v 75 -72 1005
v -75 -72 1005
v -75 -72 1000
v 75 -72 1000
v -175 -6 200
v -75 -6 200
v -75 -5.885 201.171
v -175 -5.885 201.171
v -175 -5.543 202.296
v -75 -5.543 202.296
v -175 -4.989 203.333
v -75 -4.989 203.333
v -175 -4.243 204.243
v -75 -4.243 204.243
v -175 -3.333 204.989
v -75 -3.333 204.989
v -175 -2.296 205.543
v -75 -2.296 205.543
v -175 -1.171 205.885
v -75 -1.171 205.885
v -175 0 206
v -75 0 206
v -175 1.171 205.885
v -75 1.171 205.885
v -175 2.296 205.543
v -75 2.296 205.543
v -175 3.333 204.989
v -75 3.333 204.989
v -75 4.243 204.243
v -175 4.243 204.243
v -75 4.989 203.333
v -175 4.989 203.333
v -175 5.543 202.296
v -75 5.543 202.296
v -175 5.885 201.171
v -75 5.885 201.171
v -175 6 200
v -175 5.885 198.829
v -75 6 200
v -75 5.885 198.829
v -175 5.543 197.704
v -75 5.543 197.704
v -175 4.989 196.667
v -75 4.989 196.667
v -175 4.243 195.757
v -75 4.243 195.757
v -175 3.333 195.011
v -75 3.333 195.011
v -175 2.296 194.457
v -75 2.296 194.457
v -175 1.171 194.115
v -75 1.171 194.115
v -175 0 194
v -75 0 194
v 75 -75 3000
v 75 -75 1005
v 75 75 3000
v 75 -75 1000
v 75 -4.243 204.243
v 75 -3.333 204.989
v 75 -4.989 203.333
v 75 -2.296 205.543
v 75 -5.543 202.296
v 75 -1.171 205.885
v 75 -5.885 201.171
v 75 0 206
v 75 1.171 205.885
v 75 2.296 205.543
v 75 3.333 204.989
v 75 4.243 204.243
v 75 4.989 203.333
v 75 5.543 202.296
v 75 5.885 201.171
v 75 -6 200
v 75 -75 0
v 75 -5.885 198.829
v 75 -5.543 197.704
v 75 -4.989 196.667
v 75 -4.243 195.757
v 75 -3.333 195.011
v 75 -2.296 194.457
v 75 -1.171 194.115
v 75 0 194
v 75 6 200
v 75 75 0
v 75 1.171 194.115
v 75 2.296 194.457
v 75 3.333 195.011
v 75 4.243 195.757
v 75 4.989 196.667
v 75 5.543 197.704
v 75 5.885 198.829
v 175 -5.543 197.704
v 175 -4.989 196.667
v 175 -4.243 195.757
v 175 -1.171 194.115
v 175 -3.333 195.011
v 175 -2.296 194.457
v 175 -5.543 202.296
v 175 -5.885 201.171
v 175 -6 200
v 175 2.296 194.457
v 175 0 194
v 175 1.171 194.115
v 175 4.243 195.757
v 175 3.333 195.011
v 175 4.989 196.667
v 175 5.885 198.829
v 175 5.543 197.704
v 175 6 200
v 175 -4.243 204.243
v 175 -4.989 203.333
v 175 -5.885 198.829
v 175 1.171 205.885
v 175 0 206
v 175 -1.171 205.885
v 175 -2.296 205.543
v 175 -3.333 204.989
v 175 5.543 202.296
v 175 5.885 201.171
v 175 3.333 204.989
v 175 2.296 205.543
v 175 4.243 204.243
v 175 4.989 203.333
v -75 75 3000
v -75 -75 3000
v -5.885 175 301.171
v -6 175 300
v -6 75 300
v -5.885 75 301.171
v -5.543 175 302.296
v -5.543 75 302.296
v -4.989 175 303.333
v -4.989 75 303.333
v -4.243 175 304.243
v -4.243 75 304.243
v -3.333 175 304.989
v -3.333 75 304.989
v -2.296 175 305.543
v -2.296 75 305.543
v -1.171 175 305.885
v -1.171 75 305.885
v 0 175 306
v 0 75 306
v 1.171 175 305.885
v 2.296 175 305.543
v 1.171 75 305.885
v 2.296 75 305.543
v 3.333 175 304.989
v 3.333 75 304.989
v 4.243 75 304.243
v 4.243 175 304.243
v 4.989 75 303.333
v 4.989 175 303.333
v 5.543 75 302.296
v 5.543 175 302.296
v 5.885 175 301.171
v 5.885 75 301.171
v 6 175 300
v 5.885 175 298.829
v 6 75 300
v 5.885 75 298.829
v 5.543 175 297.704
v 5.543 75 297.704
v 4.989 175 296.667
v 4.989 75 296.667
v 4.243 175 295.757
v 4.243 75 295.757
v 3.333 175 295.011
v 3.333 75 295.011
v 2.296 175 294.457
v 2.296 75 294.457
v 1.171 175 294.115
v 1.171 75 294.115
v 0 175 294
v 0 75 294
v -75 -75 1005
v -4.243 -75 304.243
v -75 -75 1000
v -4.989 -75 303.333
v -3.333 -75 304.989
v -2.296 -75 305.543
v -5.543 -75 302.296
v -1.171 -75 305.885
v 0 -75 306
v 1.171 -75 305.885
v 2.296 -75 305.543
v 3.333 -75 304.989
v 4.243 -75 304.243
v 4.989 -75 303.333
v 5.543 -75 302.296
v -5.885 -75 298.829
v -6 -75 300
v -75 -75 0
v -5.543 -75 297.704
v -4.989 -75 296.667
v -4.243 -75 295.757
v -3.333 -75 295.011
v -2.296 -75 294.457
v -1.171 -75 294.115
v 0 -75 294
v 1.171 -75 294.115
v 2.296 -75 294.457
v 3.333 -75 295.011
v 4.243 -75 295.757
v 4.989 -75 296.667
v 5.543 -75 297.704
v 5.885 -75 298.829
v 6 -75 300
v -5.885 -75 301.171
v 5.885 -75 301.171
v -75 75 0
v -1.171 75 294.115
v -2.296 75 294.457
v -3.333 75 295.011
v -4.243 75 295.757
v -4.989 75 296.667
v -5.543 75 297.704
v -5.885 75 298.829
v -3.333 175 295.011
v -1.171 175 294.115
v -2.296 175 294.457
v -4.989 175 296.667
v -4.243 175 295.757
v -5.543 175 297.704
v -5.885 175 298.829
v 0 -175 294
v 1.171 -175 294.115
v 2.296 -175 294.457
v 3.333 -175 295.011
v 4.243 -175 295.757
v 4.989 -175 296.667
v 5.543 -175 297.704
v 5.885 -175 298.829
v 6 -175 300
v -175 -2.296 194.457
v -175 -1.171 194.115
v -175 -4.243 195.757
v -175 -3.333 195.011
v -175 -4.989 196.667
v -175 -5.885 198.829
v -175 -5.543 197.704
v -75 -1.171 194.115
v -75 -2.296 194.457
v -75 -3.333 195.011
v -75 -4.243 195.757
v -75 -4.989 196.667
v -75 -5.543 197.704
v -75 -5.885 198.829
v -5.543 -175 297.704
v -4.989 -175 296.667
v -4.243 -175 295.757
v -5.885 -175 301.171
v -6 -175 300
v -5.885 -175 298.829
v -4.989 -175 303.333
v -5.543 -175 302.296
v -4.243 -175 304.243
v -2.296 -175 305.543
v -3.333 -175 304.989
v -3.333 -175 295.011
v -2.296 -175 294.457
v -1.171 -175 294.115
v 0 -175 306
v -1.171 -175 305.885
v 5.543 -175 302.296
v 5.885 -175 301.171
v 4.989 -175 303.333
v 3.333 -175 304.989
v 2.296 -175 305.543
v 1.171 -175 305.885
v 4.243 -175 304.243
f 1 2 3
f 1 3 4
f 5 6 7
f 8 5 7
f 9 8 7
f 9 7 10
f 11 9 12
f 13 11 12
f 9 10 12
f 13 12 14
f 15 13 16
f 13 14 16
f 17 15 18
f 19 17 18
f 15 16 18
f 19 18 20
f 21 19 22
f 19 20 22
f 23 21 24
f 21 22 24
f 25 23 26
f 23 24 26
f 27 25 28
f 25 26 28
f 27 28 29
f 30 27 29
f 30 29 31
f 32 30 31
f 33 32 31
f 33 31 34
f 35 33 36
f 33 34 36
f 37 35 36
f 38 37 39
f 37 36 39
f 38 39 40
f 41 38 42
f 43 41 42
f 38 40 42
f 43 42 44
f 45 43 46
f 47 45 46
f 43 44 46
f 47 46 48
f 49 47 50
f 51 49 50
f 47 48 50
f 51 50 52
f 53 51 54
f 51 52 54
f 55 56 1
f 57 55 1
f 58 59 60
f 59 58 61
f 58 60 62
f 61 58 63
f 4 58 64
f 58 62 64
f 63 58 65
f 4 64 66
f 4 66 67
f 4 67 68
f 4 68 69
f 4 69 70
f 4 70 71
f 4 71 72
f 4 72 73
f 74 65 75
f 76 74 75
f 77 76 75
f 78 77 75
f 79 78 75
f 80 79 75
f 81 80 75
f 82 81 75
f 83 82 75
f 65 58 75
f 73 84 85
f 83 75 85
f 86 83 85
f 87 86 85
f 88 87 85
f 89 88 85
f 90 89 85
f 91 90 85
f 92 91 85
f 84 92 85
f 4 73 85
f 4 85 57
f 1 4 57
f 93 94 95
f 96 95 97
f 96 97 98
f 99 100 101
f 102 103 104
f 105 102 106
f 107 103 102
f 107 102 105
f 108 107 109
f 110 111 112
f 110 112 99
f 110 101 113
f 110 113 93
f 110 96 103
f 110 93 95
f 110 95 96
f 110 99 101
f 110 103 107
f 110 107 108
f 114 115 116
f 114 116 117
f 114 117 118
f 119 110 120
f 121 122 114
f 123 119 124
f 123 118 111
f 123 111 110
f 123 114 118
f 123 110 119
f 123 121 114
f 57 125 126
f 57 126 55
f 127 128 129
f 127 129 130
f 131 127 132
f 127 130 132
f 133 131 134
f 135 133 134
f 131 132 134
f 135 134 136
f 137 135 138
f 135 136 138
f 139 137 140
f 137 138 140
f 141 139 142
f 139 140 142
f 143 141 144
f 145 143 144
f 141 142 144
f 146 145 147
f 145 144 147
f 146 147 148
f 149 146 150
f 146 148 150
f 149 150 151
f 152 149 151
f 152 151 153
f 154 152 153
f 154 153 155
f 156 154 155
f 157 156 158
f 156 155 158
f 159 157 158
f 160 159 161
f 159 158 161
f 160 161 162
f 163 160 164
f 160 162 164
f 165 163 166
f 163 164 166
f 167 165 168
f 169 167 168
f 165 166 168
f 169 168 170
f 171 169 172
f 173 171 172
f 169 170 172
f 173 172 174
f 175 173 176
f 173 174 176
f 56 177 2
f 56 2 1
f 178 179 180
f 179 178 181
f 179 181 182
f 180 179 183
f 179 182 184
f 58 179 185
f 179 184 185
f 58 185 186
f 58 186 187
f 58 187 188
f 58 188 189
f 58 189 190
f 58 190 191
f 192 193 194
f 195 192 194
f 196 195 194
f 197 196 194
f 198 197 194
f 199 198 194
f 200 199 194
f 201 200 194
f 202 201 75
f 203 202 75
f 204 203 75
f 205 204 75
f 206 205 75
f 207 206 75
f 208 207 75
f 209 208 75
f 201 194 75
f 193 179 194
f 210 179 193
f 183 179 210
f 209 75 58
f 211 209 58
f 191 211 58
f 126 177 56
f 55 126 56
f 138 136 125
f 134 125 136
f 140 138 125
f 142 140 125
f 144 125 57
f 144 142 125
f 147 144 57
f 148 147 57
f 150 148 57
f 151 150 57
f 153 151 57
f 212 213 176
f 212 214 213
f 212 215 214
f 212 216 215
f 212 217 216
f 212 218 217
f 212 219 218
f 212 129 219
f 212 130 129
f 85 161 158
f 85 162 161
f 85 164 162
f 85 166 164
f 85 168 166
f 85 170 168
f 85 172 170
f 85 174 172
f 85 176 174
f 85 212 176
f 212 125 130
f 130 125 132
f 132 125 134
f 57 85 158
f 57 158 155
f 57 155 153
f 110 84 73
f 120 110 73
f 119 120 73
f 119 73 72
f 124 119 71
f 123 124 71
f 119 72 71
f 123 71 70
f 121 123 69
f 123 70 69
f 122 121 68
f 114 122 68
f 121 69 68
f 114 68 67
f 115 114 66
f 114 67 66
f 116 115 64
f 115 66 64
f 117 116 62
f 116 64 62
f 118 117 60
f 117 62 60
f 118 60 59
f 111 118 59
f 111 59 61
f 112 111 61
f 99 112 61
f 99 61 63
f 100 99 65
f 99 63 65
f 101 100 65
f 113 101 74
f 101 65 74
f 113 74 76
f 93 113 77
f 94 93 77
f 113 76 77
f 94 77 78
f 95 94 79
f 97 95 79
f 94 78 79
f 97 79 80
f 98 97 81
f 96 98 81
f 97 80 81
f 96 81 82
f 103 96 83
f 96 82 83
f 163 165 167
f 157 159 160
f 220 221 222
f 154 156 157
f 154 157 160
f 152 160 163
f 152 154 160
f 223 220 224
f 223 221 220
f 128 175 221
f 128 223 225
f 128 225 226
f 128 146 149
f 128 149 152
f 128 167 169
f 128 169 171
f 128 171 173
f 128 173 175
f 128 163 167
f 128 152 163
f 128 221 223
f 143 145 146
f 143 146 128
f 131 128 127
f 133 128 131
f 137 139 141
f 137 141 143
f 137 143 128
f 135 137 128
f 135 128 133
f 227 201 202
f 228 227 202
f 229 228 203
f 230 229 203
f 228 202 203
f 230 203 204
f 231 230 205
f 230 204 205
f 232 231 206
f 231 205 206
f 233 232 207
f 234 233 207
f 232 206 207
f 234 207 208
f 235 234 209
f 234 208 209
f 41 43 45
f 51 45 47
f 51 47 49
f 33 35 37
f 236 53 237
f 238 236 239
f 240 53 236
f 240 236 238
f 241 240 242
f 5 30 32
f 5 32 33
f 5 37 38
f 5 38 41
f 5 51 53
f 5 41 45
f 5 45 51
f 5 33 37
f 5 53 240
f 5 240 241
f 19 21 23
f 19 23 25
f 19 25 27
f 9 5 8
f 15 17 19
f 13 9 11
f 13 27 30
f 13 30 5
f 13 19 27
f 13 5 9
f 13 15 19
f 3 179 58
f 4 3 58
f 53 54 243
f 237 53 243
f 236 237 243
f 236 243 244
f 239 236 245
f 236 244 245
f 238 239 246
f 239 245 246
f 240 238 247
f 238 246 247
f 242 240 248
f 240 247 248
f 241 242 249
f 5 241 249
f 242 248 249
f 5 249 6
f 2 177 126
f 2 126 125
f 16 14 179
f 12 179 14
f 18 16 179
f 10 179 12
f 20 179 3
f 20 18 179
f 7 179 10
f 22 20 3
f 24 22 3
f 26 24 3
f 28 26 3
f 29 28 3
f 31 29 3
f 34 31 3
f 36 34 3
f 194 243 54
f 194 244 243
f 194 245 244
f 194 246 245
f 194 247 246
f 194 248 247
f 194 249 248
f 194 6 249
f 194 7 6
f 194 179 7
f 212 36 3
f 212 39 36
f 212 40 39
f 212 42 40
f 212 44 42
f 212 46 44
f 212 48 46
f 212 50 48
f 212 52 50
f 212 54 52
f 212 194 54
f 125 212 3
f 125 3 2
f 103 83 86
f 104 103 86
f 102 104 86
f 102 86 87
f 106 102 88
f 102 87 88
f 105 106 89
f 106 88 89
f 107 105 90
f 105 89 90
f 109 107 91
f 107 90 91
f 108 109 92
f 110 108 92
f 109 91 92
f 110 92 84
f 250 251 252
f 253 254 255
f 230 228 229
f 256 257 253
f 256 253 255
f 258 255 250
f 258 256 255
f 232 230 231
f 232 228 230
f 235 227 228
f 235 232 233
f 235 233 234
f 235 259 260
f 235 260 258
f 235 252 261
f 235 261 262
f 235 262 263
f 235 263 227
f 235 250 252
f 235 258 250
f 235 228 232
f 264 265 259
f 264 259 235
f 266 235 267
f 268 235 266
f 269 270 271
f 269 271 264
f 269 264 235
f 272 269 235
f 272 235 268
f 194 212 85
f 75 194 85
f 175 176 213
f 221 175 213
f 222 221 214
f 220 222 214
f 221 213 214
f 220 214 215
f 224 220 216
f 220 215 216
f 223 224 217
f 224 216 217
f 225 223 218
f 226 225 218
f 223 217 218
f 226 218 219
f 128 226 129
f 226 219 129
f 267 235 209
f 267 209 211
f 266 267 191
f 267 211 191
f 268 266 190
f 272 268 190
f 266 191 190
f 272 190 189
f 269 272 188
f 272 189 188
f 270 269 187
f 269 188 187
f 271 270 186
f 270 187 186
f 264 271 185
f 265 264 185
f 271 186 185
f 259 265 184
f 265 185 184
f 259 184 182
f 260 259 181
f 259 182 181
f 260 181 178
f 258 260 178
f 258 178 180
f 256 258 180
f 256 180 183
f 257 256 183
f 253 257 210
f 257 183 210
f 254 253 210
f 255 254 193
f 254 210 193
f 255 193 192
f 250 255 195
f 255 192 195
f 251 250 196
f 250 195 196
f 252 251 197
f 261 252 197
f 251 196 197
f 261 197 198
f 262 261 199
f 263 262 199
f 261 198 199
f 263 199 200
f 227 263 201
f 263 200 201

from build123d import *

# Parameters (mm, degrees)
F0_W      = 150
F0_H      = 150
F1_DEPTH  = 3000
F3_DEPTH  = 100
F5_DEPTH  = 100
F7_DEPTH  = 100
F9_DEPTH  = 100
F10_W     = 150
F10_H     = 5
F11_DEPTH = 3


with BuildPart() as f1:
    # F0 (on Top) → F1 (new body)
    with BuildSketch(Plane.XY):
        Rectangle(F0_W, F0_H)
    extrude(amount=F1_DEPTH)

    # F2 (on face) → F3 (join)
    with BuildSketch(Plane.XZ.offset(75)):
        with BuildLine():
            ThreePointArc((0, 294), (4.242641, 295.757359), (6, 300))
            ThreePointArc((6, 300), (-4.242641, 304.242641), (0, 294))
        make_face()
    extrude(amount=F3_DEPTH)

    # F4 (on face) → F5 (join)
    with BuildSketch(Plane(origin=(0, 75, 0), x_dir=(-1, 0, 0), z_dir=(0, 1, 0))):
        with BuildLine():
            ThreePointArc((0, 294), (4.242641, 295.757359), (6, 300))
            ThreePointArc((6, 300), (-4.242641, 304.242641), (0, 294))
        make_face()
    extrude(amount=F5_DEPTH)

    # F6 (on face) → F7 (join)
    with BuildSketch(Plane(origin=(-75, 0, 0), x_dir=(0, -1, 0), z_dir=(-1, 0, 0))):
        with BuildLine():
            ThreePointArc((0, 194), (4.242641, 195.757359), (6, 200))
            ThreePointArc((6, 200), (-4.242641, 204.242641), (0, 194))
        make_face()
    extrude(amount=F7_DEPTH)

    # F8 (on face) → F9 (join)
    with BuildSketch(Plane.YZ.offset(75)):
        with BuildLine():
            ThreePointArc((0, 194), (4.242641, 195.757359), (6, 200))
            ThreePointArc((6, 200), (-4.242641, 204.242641), (0, 194))
        make_face()
    extrude(amount=F9_DEPTH)

    # F10 (on face) → F11 (cut)
    with BuildSketch(Plane.XZ.offset(75)):
        with Locations((0, 1002.5)):
            Rectangle(F10_W, F10_H)
    extrude(amount=-F11_DEPTH, mode=Mode.SUBTRACT)


solid = f1.part
